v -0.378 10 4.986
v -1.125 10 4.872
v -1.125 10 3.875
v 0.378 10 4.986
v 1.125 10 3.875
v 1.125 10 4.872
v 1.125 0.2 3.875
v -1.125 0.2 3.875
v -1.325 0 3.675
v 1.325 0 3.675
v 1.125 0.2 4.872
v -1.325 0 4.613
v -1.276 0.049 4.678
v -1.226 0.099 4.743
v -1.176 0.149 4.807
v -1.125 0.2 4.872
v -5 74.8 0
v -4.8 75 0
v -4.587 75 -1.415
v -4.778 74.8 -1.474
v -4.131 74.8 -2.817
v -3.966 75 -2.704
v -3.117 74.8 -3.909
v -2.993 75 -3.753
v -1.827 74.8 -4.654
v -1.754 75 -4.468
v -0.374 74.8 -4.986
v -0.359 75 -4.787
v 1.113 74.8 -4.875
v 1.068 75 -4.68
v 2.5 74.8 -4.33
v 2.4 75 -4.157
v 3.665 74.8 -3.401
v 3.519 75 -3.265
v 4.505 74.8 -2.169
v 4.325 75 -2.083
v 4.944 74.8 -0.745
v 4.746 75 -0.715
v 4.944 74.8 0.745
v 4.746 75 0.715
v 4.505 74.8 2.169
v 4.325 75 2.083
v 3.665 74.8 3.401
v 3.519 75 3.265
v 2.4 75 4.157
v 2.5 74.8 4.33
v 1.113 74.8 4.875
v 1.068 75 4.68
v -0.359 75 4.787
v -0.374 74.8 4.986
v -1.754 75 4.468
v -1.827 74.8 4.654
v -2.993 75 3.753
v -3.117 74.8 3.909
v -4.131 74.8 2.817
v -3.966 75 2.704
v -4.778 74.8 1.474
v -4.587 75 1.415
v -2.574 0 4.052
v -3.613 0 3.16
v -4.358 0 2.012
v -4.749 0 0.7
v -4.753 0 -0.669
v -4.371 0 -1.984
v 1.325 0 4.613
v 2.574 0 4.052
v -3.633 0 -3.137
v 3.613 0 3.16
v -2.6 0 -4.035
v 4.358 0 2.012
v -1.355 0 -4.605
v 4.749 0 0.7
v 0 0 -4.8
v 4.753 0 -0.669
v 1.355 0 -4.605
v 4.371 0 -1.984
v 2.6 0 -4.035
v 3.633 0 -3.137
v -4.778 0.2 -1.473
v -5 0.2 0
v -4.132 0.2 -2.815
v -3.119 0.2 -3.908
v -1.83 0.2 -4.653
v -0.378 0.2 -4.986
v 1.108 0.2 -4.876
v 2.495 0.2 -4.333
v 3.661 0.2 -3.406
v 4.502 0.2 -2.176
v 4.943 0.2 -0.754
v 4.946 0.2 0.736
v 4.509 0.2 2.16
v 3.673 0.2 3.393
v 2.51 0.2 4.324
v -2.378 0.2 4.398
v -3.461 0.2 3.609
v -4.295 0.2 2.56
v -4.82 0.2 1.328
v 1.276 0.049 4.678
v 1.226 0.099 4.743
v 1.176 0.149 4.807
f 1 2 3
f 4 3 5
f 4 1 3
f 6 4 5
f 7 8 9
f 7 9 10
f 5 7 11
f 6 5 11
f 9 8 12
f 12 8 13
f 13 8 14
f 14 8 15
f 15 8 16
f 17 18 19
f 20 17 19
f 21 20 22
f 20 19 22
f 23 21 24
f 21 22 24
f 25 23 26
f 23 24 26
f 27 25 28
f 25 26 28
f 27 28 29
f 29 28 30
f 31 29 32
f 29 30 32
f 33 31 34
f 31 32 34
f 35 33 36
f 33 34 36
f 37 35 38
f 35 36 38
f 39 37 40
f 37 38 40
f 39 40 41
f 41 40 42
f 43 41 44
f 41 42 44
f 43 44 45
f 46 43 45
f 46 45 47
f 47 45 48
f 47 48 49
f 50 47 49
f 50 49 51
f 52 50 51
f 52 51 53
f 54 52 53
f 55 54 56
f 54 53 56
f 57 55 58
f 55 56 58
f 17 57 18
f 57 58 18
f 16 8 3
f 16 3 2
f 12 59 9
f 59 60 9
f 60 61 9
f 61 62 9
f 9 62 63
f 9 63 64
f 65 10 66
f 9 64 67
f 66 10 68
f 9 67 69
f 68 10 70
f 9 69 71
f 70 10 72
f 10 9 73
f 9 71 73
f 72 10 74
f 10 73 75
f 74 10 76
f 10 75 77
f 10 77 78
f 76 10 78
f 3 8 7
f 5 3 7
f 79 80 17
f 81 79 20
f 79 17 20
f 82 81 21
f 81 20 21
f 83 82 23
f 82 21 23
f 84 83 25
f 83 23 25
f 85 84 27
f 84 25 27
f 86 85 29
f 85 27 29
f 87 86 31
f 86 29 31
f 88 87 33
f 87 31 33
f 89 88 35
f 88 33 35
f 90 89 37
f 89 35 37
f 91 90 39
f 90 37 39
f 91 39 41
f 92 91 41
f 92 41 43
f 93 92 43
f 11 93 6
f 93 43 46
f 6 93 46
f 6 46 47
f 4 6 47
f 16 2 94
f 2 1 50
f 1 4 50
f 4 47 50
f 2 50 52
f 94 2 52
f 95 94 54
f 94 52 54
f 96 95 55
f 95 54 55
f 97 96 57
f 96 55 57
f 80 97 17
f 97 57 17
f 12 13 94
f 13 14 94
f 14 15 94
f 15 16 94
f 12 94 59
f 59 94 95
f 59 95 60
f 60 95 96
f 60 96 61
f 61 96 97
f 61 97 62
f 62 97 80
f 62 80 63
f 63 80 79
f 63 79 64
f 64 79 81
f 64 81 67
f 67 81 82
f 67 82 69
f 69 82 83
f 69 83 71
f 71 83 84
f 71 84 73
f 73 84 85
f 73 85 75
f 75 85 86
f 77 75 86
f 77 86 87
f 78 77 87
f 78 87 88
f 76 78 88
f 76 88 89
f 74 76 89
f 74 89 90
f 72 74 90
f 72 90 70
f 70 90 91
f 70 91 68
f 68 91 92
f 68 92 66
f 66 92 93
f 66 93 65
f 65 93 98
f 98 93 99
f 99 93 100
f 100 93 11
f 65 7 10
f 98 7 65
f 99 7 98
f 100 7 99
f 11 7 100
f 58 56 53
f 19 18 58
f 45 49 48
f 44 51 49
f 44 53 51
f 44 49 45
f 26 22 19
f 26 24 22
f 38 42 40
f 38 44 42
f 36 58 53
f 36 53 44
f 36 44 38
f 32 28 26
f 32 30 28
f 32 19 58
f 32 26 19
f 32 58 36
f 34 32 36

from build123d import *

# Parameters (mm, degrees)
SKETCH1_W          = 5
SKETCH1_H          = 75
SKETCH2_W          = 2.25
SKETCH2_H          = 2.25
CUT_EXTRUDE1_DEPTH = 10
CHAMFER1_SIZE      = 0.2


with BuildPart() as part:
    # Sketch1 → Revolve1 (revolve)
    with BuildSketch(Plane.XY, mode=Mode.PRIVATE) as revolve1_sk:
        with Locations((2.5, 37.5)):
            Rectangle(SKETCH1_W, SKETCH1_H)
    revolve(revolve1_sk.sketch.rotate(Axis((0, 75, 0), (0, -1, 0)), 180), axis=Axis((0, 75, 0), (0, -1, 0)))

    # Sketch2 → Cut-Extrude1 (cut)
    with BuildSketch(Plane.XZ):
        with Locations((0, 5)):
            Rectangle(SKETCH2_W, SKETCH2_H)
    extrude(amount=-CUT_EXTRUDE1_DEPTH, mode=Mode.SUBTRACT)

    # Chamfer1
    chamfer1_edges = [part.edges().sort_by_distance(p)[0] for p in [
        (1.125, 0, 4.373396909),
        (0, 0, 3.875),
        (5, 75, 0),
        (3.112474899, 0, -3.913118961),
        (-1.125, 0, 4.373396909),
    ]]
    chamfer(chamfer1_edges, length=CHAMFER1_SIZE)


solid = part.part
